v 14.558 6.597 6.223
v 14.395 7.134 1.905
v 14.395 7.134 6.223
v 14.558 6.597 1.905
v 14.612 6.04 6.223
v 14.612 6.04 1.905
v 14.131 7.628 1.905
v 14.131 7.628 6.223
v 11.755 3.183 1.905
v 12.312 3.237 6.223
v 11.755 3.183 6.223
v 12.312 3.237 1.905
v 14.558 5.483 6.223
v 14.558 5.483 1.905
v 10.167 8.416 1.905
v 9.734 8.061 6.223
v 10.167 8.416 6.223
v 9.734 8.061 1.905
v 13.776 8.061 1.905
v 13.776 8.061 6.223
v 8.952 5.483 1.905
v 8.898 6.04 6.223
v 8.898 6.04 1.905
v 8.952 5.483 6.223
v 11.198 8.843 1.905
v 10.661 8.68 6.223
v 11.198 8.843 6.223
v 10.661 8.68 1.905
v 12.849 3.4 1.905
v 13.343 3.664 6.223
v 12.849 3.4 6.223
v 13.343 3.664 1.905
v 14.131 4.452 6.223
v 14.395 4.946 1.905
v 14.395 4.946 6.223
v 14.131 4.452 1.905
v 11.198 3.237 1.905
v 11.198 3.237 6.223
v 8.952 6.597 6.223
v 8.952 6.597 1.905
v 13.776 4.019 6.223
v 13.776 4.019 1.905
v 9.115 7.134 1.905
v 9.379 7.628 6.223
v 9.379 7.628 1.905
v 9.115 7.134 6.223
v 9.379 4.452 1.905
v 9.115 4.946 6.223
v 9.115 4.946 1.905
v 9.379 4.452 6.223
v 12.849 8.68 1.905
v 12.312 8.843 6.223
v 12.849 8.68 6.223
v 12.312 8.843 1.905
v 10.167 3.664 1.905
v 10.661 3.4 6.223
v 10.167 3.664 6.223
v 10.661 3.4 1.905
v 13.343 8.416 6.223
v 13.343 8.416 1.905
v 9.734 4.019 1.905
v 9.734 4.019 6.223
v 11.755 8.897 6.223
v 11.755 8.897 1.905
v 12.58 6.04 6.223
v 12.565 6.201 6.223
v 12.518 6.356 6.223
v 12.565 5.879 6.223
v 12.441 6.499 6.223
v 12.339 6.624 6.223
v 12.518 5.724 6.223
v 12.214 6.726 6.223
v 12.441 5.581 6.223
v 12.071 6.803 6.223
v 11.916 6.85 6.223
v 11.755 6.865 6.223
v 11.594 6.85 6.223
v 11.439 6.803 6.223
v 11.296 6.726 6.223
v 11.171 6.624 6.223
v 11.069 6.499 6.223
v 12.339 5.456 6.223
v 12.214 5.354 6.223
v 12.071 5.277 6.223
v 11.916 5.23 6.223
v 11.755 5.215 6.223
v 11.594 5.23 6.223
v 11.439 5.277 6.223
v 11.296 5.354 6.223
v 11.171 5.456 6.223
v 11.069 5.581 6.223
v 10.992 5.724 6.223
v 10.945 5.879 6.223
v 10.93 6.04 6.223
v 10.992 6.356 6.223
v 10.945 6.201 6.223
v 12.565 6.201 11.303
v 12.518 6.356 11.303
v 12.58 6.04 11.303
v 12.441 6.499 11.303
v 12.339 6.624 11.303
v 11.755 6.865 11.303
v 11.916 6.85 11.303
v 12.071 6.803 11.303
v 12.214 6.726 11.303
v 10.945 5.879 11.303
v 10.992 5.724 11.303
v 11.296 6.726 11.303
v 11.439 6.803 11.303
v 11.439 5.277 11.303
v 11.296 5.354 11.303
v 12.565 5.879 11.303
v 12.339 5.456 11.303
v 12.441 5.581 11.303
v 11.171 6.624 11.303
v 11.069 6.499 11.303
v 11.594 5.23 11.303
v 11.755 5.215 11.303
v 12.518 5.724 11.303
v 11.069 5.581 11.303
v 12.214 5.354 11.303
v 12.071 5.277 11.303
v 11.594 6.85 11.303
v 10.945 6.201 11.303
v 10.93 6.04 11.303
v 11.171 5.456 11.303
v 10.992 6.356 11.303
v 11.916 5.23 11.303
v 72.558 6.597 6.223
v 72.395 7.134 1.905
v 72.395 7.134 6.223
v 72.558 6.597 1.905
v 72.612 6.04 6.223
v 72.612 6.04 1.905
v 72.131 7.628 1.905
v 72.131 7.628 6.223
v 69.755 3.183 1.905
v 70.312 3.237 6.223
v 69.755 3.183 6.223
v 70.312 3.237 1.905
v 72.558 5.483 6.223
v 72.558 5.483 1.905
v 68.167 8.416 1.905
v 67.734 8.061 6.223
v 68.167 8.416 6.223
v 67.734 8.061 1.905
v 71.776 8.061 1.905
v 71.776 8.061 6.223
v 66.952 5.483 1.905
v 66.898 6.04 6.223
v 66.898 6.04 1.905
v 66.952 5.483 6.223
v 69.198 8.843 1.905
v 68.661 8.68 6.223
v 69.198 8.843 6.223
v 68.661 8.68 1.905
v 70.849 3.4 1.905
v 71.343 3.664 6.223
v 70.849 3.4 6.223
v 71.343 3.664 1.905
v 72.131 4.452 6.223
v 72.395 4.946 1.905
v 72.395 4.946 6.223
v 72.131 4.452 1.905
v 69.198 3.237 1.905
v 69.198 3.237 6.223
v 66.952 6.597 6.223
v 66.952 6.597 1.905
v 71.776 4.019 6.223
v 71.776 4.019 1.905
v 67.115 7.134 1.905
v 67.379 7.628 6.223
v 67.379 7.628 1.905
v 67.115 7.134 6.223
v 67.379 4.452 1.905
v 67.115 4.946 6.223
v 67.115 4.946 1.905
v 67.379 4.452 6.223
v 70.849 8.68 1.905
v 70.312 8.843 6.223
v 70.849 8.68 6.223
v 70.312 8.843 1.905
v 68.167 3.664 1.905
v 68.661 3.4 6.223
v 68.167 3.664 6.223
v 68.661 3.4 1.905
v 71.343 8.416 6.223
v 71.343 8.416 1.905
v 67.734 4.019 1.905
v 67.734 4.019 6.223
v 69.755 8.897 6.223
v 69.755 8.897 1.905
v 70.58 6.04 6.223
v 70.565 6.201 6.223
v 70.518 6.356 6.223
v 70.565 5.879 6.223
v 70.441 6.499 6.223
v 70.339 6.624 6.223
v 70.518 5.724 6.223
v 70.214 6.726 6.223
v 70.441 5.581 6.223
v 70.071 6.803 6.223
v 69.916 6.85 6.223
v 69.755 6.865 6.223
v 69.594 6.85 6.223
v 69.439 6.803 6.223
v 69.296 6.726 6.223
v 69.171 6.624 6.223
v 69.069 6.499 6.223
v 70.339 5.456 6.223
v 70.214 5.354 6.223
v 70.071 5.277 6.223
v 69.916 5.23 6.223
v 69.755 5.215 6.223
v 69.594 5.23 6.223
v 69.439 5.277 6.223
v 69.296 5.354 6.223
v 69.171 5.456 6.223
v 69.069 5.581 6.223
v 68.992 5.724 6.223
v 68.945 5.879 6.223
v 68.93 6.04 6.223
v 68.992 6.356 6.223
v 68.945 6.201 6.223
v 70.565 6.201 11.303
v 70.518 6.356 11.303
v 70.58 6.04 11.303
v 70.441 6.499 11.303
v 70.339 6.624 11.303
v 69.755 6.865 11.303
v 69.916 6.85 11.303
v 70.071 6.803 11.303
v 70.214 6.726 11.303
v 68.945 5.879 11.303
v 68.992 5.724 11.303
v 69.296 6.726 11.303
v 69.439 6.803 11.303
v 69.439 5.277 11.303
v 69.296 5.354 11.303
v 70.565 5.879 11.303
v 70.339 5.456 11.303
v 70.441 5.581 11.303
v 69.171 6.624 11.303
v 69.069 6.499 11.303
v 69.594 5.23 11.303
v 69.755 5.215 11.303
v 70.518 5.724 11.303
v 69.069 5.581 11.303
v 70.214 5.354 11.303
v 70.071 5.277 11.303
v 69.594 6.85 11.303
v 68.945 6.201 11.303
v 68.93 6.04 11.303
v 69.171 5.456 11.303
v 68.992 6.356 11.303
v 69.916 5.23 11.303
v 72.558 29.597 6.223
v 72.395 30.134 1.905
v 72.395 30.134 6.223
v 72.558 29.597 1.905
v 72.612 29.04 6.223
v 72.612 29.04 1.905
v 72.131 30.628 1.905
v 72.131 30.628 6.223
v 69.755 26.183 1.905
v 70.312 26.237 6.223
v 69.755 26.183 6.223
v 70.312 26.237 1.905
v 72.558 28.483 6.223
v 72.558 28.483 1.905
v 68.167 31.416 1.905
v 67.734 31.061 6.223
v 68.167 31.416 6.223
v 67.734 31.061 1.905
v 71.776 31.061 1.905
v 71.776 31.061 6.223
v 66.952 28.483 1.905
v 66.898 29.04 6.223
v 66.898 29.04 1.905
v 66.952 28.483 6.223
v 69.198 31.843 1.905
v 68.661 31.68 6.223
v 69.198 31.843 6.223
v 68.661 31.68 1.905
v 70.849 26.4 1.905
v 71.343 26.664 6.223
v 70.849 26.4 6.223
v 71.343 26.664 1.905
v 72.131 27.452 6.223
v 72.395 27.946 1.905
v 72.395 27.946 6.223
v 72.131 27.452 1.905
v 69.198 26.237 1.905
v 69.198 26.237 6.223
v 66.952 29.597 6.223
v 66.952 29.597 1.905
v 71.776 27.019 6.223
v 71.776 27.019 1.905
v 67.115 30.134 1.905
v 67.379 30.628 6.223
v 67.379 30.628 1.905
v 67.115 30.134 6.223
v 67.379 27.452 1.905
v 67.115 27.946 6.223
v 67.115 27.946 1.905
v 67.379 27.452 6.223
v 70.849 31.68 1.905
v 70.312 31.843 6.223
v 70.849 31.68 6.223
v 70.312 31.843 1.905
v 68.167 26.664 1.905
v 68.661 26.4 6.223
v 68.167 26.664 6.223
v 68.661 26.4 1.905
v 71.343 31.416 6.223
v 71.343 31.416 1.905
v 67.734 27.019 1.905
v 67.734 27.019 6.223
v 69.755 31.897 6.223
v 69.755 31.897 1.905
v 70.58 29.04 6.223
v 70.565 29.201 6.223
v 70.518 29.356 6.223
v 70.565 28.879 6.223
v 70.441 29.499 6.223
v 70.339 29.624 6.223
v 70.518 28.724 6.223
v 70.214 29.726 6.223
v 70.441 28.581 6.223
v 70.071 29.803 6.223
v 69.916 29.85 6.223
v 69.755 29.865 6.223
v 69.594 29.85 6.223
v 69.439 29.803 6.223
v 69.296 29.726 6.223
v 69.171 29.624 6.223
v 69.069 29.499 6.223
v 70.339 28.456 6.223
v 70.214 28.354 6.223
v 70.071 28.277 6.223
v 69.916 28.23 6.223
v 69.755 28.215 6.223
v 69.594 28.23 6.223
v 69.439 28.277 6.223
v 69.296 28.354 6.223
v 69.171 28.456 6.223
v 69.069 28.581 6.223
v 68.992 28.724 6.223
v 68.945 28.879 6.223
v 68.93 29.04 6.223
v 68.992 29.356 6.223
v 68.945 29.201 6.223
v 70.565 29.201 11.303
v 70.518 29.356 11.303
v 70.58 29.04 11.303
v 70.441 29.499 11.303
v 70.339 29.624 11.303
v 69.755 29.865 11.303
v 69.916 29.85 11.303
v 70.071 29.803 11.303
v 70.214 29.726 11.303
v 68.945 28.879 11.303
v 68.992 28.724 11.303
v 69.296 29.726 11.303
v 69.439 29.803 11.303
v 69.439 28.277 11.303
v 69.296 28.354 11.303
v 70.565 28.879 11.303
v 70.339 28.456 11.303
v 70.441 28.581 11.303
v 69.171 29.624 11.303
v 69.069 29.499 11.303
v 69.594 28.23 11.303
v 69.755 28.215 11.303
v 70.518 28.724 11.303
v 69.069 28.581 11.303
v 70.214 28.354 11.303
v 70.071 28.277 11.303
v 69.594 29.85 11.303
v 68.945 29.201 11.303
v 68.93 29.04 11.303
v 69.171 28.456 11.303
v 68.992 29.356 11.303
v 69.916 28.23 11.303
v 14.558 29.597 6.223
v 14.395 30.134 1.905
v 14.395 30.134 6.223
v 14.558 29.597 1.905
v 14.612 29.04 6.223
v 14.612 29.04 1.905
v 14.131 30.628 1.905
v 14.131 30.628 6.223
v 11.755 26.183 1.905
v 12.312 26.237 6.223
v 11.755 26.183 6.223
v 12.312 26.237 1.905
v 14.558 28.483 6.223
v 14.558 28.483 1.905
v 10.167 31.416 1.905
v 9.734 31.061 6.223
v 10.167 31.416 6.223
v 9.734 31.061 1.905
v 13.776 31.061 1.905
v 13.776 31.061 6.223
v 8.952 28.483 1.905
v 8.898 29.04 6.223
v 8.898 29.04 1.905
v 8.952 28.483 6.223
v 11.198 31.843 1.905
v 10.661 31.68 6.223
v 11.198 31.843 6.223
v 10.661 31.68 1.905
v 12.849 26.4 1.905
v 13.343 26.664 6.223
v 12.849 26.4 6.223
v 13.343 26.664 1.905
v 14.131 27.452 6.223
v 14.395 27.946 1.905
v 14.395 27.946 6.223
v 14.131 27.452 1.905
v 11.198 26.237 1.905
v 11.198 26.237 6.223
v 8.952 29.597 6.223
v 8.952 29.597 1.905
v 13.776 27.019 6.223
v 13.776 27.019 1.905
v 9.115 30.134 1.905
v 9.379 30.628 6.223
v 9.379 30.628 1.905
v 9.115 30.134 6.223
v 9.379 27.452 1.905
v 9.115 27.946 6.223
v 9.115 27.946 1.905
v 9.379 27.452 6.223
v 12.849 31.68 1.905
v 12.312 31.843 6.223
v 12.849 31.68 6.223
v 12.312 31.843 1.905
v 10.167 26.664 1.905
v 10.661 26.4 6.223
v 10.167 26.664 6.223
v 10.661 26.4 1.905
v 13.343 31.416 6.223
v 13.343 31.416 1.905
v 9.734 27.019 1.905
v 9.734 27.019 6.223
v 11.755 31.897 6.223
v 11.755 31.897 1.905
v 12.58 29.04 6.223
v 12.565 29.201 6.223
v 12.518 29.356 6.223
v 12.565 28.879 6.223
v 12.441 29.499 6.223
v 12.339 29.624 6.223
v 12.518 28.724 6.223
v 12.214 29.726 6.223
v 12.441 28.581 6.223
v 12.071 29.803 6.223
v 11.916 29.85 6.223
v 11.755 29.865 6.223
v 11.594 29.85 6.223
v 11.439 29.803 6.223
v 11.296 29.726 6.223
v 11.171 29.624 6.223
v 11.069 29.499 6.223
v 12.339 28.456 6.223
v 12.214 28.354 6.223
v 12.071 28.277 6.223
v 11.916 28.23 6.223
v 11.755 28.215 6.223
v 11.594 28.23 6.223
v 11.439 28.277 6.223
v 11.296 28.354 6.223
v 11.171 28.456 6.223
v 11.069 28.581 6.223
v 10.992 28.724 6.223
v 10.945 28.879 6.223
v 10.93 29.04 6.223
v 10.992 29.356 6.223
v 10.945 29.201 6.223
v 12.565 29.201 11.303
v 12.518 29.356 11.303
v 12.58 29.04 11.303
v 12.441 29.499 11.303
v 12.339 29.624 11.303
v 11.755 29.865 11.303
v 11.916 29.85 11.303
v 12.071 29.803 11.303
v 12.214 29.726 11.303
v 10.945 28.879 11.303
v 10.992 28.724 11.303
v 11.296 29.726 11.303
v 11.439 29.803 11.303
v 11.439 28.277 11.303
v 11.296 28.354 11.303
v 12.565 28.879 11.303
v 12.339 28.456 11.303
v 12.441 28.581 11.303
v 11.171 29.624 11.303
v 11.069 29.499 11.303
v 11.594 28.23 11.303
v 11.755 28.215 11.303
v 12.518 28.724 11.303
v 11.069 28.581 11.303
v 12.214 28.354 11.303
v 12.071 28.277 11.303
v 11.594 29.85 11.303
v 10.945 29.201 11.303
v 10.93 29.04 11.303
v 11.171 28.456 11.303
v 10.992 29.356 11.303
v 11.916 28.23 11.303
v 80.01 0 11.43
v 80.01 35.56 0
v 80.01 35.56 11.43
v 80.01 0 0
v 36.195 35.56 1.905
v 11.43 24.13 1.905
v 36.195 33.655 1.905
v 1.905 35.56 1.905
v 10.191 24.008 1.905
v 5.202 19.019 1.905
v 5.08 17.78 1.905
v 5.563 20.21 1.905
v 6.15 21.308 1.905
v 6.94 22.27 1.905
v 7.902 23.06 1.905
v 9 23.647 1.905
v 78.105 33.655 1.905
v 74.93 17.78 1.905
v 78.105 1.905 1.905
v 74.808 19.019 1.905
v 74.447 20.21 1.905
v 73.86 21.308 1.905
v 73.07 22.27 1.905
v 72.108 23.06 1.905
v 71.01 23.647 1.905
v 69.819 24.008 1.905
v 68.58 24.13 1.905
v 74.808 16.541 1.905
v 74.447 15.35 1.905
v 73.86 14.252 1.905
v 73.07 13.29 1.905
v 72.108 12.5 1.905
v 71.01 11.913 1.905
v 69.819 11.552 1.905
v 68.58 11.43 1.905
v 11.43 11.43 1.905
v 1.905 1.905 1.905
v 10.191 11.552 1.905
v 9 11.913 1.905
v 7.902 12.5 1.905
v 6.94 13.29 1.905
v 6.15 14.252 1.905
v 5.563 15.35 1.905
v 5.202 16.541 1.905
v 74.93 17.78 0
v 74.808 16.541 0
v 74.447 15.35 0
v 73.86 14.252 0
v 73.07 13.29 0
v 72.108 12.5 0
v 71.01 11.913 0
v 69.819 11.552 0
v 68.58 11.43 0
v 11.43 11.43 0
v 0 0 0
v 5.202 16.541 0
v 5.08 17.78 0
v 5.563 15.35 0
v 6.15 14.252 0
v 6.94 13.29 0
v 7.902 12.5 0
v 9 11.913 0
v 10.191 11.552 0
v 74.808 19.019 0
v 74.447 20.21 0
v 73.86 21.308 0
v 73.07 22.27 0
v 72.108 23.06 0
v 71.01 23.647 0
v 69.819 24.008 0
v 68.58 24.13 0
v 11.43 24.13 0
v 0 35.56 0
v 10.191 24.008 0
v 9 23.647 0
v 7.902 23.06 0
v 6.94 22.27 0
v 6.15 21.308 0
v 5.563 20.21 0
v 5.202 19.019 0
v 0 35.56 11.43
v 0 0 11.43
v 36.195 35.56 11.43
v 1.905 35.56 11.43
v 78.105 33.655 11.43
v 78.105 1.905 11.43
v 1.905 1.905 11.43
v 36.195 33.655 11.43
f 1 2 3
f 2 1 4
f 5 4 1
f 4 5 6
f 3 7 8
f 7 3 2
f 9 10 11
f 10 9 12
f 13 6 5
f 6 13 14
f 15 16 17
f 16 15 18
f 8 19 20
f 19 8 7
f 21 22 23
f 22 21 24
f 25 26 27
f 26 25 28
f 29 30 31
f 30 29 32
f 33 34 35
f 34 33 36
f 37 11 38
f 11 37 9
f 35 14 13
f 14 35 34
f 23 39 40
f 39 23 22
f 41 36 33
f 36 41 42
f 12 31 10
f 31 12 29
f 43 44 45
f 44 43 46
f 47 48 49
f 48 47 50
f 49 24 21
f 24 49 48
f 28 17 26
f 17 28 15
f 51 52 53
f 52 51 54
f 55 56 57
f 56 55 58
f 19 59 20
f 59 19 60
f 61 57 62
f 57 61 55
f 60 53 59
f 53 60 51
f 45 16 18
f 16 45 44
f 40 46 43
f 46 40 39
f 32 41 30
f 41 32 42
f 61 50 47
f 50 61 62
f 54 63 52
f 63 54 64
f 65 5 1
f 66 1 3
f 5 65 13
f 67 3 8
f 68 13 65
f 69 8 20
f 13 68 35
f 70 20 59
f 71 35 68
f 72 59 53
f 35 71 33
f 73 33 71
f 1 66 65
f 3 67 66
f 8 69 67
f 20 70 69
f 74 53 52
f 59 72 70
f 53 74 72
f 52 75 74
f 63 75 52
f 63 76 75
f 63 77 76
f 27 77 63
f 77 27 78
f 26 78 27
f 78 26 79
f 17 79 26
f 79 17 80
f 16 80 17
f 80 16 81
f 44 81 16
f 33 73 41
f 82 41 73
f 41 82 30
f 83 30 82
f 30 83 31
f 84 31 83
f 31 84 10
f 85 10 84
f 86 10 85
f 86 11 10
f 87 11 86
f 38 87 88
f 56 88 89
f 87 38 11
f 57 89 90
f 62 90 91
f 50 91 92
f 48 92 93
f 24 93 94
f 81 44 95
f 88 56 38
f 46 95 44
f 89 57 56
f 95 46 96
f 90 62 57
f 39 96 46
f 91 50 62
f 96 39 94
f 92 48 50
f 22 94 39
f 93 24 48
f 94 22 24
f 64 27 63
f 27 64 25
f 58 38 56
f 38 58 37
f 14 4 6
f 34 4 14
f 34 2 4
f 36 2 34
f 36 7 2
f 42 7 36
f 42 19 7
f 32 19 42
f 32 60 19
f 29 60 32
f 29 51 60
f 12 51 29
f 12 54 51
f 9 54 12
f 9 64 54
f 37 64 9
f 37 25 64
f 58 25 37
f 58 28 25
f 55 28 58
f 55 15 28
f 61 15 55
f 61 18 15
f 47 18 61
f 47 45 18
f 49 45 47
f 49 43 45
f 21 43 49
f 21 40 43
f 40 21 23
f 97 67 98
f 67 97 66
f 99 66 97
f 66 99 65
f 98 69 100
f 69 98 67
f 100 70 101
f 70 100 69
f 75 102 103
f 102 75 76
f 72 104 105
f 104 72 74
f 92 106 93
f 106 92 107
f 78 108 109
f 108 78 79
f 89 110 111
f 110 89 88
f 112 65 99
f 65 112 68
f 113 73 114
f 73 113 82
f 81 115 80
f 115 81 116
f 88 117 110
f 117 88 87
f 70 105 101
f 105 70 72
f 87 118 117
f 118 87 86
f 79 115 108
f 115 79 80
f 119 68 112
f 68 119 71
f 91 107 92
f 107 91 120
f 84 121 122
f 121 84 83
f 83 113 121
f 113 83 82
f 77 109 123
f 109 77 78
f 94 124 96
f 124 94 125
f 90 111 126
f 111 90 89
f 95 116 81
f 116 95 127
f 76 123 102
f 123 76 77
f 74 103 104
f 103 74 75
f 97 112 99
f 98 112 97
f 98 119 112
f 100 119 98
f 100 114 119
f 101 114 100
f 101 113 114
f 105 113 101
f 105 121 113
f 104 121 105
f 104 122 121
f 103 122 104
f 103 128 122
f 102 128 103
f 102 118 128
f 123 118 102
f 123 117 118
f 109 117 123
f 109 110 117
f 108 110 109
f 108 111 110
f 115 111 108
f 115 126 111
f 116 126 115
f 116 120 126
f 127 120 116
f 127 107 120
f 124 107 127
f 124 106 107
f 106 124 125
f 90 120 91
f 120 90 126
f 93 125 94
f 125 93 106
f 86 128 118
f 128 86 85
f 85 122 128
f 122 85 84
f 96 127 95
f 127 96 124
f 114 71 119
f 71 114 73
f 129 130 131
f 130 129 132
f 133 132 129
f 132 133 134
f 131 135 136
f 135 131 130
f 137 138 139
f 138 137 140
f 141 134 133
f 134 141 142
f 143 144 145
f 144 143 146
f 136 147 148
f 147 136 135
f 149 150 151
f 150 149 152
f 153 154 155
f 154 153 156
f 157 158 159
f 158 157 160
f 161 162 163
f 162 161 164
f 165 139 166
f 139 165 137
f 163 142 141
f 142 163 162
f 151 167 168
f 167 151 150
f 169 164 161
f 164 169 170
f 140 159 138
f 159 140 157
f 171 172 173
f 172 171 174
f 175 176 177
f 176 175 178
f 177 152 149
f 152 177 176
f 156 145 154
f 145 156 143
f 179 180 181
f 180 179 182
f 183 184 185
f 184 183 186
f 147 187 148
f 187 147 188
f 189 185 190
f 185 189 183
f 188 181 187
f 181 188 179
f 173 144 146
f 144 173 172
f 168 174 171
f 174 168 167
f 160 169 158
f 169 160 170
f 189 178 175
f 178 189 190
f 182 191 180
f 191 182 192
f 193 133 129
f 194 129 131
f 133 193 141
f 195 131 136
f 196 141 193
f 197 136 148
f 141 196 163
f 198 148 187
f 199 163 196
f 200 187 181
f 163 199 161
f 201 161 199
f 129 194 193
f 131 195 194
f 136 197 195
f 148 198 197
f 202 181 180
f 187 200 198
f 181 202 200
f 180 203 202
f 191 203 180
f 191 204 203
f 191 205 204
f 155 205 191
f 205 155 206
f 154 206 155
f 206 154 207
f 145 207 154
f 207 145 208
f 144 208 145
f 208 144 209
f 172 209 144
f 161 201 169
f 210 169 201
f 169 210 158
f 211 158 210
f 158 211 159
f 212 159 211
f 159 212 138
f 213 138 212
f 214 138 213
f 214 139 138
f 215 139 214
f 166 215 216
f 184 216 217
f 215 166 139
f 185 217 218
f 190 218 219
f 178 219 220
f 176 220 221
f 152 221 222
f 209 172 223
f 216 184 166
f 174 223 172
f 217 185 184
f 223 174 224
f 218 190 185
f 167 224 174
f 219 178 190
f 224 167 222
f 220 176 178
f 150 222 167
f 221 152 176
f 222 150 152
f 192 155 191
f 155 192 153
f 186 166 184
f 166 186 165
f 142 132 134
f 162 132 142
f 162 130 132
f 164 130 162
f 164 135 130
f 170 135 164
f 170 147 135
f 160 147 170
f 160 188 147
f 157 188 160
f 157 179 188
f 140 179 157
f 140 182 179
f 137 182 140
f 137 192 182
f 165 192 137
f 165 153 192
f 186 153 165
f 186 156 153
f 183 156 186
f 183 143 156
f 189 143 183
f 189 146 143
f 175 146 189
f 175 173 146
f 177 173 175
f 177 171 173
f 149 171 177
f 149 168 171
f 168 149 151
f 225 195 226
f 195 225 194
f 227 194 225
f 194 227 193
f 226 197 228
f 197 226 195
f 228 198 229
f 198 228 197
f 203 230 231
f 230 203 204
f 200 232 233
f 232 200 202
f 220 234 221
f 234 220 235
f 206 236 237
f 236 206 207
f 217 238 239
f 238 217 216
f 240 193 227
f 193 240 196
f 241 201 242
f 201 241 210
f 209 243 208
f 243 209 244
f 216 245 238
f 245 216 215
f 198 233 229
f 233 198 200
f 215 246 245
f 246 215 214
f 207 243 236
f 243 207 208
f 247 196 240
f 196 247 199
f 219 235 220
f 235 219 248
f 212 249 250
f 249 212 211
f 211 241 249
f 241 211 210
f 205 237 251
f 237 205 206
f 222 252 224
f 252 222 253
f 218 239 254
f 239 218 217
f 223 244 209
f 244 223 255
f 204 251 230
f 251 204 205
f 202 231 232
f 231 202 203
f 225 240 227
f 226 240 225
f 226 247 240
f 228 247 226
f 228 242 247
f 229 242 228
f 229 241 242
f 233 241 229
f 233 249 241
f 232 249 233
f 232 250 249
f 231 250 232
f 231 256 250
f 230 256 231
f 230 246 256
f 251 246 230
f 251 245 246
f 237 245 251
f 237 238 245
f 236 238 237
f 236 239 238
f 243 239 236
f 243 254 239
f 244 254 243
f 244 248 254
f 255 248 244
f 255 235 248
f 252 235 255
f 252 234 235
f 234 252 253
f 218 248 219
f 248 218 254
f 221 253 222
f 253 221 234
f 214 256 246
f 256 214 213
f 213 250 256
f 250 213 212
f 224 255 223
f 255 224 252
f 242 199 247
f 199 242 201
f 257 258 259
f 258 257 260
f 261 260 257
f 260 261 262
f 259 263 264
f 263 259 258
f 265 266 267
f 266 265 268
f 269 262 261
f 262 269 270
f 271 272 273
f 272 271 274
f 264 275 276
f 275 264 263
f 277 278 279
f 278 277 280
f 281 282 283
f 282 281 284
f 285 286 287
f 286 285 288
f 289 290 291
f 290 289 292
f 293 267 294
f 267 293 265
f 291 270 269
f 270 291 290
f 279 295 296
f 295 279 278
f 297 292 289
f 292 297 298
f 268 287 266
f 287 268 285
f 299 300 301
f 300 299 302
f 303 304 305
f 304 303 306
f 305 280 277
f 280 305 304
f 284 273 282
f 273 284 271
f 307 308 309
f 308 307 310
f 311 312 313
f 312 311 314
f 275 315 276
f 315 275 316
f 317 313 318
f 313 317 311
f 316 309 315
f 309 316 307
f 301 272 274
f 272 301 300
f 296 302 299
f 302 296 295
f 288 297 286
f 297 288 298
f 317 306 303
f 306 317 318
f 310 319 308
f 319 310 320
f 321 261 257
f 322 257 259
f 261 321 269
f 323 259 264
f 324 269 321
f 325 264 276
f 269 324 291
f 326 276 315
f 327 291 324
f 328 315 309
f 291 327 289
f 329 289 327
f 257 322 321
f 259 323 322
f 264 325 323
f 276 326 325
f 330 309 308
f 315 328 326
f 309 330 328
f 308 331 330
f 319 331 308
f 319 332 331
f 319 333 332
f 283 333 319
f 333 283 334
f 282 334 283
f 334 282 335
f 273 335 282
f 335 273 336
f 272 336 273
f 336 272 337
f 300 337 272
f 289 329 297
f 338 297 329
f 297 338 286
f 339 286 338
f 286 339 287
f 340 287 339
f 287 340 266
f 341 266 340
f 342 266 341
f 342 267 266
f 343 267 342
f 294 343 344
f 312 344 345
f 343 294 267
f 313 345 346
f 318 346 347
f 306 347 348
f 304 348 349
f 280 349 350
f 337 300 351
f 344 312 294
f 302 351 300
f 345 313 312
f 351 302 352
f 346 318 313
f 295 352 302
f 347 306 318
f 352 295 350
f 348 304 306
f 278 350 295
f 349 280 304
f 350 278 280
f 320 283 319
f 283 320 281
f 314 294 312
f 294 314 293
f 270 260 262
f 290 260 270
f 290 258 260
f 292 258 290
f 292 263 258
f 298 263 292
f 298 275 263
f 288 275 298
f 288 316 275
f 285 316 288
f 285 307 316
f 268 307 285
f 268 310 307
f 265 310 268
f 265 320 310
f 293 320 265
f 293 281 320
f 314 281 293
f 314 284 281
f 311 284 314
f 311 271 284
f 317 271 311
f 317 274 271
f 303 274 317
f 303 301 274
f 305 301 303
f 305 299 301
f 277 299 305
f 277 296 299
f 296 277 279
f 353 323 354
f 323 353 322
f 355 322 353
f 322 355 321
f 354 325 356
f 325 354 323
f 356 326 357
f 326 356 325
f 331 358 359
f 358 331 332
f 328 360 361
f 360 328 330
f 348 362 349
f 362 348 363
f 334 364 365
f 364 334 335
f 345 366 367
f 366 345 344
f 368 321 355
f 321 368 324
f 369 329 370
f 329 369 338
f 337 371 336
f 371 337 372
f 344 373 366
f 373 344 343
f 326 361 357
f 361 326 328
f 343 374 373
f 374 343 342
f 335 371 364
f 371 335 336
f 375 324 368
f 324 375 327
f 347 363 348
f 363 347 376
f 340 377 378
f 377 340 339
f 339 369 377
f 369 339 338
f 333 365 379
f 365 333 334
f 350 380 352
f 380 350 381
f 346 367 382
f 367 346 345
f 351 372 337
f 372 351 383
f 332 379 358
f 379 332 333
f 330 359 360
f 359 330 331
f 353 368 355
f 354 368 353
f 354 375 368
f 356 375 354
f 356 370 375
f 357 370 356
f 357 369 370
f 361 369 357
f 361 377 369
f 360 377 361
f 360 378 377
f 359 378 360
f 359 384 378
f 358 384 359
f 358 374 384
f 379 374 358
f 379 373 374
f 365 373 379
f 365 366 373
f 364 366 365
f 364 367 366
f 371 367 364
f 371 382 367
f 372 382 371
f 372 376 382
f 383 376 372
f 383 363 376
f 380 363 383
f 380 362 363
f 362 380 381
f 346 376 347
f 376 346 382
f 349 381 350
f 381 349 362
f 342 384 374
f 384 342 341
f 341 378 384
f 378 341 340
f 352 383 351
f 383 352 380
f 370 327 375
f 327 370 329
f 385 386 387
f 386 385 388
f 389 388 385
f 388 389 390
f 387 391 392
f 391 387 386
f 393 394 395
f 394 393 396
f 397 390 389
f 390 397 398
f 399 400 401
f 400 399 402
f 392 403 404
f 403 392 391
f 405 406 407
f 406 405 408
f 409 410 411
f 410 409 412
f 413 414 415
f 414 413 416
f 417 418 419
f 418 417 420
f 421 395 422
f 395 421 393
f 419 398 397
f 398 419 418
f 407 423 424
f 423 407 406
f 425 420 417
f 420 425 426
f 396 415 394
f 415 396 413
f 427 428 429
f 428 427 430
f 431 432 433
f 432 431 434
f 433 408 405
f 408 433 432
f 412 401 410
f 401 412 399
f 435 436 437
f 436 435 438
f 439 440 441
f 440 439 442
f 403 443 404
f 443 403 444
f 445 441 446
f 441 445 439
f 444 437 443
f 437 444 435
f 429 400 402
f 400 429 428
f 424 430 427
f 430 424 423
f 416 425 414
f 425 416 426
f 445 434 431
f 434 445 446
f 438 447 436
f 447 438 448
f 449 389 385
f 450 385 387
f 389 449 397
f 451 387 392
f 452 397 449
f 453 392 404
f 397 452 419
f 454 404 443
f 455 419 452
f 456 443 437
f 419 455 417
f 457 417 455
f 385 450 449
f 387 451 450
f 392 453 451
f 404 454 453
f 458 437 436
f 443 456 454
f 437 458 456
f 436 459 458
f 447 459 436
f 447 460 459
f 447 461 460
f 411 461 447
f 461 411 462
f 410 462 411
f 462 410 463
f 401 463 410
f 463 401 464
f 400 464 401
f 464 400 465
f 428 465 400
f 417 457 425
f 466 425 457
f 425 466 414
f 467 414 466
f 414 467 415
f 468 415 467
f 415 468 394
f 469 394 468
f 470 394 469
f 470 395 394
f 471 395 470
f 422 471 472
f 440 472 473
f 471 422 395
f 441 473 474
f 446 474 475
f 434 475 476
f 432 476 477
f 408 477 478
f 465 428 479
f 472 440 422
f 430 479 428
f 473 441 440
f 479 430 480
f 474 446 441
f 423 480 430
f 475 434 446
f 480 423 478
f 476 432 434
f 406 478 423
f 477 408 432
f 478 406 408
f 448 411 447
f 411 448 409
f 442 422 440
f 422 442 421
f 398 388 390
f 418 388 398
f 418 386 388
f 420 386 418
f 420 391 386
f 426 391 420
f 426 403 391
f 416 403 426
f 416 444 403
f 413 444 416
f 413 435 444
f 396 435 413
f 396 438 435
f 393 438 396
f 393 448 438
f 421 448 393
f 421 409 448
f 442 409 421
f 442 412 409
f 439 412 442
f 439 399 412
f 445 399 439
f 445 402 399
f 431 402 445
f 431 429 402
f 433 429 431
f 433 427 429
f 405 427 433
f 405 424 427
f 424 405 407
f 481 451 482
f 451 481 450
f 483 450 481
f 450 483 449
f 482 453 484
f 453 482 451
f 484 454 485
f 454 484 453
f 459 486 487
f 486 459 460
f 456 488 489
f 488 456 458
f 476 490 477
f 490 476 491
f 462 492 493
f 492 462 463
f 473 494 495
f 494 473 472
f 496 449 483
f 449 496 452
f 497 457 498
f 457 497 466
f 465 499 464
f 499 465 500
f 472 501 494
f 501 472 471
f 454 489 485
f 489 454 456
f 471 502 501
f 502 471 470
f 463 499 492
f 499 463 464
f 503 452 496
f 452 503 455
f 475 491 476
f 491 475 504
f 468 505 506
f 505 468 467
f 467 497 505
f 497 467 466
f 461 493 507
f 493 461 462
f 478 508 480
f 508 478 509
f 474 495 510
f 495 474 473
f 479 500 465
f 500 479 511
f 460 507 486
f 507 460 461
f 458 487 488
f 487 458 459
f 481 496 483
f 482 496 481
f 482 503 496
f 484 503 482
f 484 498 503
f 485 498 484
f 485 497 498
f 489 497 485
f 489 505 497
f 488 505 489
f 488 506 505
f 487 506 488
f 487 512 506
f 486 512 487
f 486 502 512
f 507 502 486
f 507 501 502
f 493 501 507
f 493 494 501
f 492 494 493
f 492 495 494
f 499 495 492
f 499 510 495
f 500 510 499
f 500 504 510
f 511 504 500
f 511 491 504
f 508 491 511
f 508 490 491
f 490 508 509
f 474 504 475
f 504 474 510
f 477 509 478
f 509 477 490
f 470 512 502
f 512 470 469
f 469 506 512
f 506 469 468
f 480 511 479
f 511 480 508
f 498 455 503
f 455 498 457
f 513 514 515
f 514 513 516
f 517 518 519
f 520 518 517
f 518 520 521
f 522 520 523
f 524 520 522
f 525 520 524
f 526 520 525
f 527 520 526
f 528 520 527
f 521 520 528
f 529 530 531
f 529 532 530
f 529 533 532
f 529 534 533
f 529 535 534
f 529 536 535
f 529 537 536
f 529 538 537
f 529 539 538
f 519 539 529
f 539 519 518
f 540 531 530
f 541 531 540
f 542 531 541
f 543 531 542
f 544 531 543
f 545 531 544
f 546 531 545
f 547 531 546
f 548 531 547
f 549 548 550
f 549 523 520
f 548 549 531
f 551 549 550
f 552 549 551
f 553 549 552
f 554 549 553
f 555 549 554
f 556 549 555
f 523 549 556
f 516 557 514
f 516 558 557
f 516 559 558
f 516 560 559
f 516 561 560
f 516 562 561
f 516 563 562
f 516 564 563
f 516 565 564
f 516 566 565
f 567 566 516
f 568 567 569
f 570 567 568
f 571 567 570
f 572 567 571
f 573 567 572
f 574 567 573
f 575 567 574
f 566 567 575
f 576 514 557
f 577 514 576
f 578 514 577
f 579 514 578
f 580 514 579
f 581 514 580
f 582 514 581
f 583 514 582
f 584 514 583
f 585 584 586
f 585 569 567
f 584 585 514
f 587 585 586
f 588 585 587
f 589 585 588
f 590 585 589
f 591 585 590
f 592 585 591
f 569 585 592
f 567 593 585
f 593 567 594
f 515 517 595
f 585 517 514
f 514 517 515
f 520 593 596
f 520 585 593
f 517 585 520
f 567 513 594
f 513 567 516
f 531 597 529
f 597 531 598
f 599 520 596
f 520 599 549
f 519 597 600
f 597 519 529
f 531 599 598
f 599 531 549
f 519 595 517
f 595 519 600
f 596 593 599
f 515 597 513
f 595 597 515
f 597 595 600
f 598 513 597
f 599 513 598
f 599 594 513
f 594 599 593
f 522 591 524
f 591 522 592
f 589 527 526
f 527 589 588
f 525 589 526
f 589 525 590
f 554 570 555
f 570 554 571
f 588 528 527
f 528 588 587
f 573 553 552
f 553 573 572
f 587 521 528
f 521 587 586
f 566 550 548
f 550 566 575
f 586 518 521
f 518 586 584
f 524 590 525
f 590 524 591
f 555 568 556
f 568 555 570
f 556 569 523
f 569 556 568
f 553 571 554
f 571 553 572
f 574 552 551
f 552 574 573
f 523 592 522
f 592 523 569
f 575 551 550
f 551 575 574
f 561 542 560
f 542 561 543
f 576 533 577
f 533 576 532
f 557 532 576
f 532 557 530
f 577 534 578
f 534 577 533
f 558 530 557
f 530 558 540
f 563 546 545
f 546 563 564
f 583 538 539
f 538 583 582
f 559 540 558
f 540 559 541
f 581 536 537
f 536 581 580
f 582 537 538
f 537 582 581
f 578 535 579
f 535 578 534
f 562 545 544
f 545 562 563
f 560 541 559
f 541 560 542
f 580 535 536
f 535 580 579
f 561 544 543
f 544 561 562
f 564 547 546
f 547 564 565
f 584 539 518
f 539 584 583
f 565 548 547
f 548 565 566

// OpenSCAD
// Battery retainer for FT power pods.

$fn=32; // round things are drawn in 32 segments

// dimensions in inches
WallThickness = 0.075;
InnerWidth = 1.25;
InnerLength = 3.0;
OuterWidth = InnerWidth + 2 * WallThickness;
OuterLength = InnerLength + 2 * WallThickness;
InnerHeight = 0.3;
// InnerHeight = 1.25;
OuterHeight = InnerHeight + 2 * WallThickness;

MountHoleOffsetW = 0.025 + WallThickness;
MountHoleOffsetL = 0.25 + WallThickness;
ConnSideWallL = 1.35;

PedestalHeight = 0.17;
PinHeight = PedestalHeight + 0.2;

PinDia = 0.065; 
PedestalDia = 0.225;

// dimensions in mm for a little while
mm_pinL = 58.0;
mm_pinW = 30.0 - 7.0;
mm_pinOffL = 3.5;
mm_pinOffW = 3.5;
// Now convert -- this is sad, as we're going to convert back at the bottom.
PinSpaceL = mm_pinL / 25.4;
PinSpaceW = mm_pinW / 25.4;
PinLocRL = (mm_pinOffL / 25.4) + MountHoleOffsetL;
PinLocRW = (mm_pinOffW / 25.4) + MountHoleOffsetW;


SlotW = 0.5;
SlotStartL = InnerLength * 0.15;
SlotL = InnerLength * 0.75;

SlotStartW = 0.7;

GyroBracePosW = OuterWidth - 0.3;
GyroBracePosL = 1.;
GyroBraceL = 1.0;
module GyroBrace() {
  translate([GyroBracePosL, GyroBracePosW, 0])
    cube([GyroBraceL, WallThickness, InnerHeight]);
}



module Pedestal(dir) {
  union() {
    cylinder(d = PedestalDia, h = PedestalHeight);
    cylinder(d = PinDia, h = PinHeight);
  }
}

module MountingPins() {
  translate([PinLocRL, PinLocRW, 0]) {
    translate([0, 0, 0]) Pedestal(1);
    translate([PinSpaceL, 0, 0]) Pedestal(1);
    translate([PinSpaceL, PinSpaceW, 0]) Pedestal(0);
    translate([0, PinSpaceW, 0]) Pedestal(0);
  }
}

module Slot() {
   cylinder(d=SlotW, h = 10*WallThickness);
   translate([SlotL, 0, 0]) cylinder(d=SlotW, h = 10 * WallThickness);
   translate([0, -0.5 * SlotW, -2 * WallThickness])
     cube([SlotL, SlotW, 10 * WallThickness]);
}

module ReliefSlots() {
  translate([SlotStartL, SlotStartW, -WallThickness])
    Slot();
}


module Walls() {
  difference() {
    cube([OuterLength, OuterWidth, OuterHeight]);
    union() {
      translate([WallThickness, WallThickness, WallThickness * 0.9]) cube([InnerLength, InnerWidth, OuterHeight]);
      translate([WallThickness, 5 * WallThickness, WallThickness * 0.9])
        cube([ConnSideWallL, InnerWidth, OuterHeight]);
    }
  }
}


module BasePlate() {
  union() {
    translate([0, 0, WallThickness]) MountingPins();
    cube([OuterLength, OuterWidth, WallThickness]);
  }
}

scale([25.4,25.4,25.4]) {
  difference() {
    union() {
      BasePlate();
      Walls();
    }
    union() {
      ReliefSlots();
    }
  }
}
